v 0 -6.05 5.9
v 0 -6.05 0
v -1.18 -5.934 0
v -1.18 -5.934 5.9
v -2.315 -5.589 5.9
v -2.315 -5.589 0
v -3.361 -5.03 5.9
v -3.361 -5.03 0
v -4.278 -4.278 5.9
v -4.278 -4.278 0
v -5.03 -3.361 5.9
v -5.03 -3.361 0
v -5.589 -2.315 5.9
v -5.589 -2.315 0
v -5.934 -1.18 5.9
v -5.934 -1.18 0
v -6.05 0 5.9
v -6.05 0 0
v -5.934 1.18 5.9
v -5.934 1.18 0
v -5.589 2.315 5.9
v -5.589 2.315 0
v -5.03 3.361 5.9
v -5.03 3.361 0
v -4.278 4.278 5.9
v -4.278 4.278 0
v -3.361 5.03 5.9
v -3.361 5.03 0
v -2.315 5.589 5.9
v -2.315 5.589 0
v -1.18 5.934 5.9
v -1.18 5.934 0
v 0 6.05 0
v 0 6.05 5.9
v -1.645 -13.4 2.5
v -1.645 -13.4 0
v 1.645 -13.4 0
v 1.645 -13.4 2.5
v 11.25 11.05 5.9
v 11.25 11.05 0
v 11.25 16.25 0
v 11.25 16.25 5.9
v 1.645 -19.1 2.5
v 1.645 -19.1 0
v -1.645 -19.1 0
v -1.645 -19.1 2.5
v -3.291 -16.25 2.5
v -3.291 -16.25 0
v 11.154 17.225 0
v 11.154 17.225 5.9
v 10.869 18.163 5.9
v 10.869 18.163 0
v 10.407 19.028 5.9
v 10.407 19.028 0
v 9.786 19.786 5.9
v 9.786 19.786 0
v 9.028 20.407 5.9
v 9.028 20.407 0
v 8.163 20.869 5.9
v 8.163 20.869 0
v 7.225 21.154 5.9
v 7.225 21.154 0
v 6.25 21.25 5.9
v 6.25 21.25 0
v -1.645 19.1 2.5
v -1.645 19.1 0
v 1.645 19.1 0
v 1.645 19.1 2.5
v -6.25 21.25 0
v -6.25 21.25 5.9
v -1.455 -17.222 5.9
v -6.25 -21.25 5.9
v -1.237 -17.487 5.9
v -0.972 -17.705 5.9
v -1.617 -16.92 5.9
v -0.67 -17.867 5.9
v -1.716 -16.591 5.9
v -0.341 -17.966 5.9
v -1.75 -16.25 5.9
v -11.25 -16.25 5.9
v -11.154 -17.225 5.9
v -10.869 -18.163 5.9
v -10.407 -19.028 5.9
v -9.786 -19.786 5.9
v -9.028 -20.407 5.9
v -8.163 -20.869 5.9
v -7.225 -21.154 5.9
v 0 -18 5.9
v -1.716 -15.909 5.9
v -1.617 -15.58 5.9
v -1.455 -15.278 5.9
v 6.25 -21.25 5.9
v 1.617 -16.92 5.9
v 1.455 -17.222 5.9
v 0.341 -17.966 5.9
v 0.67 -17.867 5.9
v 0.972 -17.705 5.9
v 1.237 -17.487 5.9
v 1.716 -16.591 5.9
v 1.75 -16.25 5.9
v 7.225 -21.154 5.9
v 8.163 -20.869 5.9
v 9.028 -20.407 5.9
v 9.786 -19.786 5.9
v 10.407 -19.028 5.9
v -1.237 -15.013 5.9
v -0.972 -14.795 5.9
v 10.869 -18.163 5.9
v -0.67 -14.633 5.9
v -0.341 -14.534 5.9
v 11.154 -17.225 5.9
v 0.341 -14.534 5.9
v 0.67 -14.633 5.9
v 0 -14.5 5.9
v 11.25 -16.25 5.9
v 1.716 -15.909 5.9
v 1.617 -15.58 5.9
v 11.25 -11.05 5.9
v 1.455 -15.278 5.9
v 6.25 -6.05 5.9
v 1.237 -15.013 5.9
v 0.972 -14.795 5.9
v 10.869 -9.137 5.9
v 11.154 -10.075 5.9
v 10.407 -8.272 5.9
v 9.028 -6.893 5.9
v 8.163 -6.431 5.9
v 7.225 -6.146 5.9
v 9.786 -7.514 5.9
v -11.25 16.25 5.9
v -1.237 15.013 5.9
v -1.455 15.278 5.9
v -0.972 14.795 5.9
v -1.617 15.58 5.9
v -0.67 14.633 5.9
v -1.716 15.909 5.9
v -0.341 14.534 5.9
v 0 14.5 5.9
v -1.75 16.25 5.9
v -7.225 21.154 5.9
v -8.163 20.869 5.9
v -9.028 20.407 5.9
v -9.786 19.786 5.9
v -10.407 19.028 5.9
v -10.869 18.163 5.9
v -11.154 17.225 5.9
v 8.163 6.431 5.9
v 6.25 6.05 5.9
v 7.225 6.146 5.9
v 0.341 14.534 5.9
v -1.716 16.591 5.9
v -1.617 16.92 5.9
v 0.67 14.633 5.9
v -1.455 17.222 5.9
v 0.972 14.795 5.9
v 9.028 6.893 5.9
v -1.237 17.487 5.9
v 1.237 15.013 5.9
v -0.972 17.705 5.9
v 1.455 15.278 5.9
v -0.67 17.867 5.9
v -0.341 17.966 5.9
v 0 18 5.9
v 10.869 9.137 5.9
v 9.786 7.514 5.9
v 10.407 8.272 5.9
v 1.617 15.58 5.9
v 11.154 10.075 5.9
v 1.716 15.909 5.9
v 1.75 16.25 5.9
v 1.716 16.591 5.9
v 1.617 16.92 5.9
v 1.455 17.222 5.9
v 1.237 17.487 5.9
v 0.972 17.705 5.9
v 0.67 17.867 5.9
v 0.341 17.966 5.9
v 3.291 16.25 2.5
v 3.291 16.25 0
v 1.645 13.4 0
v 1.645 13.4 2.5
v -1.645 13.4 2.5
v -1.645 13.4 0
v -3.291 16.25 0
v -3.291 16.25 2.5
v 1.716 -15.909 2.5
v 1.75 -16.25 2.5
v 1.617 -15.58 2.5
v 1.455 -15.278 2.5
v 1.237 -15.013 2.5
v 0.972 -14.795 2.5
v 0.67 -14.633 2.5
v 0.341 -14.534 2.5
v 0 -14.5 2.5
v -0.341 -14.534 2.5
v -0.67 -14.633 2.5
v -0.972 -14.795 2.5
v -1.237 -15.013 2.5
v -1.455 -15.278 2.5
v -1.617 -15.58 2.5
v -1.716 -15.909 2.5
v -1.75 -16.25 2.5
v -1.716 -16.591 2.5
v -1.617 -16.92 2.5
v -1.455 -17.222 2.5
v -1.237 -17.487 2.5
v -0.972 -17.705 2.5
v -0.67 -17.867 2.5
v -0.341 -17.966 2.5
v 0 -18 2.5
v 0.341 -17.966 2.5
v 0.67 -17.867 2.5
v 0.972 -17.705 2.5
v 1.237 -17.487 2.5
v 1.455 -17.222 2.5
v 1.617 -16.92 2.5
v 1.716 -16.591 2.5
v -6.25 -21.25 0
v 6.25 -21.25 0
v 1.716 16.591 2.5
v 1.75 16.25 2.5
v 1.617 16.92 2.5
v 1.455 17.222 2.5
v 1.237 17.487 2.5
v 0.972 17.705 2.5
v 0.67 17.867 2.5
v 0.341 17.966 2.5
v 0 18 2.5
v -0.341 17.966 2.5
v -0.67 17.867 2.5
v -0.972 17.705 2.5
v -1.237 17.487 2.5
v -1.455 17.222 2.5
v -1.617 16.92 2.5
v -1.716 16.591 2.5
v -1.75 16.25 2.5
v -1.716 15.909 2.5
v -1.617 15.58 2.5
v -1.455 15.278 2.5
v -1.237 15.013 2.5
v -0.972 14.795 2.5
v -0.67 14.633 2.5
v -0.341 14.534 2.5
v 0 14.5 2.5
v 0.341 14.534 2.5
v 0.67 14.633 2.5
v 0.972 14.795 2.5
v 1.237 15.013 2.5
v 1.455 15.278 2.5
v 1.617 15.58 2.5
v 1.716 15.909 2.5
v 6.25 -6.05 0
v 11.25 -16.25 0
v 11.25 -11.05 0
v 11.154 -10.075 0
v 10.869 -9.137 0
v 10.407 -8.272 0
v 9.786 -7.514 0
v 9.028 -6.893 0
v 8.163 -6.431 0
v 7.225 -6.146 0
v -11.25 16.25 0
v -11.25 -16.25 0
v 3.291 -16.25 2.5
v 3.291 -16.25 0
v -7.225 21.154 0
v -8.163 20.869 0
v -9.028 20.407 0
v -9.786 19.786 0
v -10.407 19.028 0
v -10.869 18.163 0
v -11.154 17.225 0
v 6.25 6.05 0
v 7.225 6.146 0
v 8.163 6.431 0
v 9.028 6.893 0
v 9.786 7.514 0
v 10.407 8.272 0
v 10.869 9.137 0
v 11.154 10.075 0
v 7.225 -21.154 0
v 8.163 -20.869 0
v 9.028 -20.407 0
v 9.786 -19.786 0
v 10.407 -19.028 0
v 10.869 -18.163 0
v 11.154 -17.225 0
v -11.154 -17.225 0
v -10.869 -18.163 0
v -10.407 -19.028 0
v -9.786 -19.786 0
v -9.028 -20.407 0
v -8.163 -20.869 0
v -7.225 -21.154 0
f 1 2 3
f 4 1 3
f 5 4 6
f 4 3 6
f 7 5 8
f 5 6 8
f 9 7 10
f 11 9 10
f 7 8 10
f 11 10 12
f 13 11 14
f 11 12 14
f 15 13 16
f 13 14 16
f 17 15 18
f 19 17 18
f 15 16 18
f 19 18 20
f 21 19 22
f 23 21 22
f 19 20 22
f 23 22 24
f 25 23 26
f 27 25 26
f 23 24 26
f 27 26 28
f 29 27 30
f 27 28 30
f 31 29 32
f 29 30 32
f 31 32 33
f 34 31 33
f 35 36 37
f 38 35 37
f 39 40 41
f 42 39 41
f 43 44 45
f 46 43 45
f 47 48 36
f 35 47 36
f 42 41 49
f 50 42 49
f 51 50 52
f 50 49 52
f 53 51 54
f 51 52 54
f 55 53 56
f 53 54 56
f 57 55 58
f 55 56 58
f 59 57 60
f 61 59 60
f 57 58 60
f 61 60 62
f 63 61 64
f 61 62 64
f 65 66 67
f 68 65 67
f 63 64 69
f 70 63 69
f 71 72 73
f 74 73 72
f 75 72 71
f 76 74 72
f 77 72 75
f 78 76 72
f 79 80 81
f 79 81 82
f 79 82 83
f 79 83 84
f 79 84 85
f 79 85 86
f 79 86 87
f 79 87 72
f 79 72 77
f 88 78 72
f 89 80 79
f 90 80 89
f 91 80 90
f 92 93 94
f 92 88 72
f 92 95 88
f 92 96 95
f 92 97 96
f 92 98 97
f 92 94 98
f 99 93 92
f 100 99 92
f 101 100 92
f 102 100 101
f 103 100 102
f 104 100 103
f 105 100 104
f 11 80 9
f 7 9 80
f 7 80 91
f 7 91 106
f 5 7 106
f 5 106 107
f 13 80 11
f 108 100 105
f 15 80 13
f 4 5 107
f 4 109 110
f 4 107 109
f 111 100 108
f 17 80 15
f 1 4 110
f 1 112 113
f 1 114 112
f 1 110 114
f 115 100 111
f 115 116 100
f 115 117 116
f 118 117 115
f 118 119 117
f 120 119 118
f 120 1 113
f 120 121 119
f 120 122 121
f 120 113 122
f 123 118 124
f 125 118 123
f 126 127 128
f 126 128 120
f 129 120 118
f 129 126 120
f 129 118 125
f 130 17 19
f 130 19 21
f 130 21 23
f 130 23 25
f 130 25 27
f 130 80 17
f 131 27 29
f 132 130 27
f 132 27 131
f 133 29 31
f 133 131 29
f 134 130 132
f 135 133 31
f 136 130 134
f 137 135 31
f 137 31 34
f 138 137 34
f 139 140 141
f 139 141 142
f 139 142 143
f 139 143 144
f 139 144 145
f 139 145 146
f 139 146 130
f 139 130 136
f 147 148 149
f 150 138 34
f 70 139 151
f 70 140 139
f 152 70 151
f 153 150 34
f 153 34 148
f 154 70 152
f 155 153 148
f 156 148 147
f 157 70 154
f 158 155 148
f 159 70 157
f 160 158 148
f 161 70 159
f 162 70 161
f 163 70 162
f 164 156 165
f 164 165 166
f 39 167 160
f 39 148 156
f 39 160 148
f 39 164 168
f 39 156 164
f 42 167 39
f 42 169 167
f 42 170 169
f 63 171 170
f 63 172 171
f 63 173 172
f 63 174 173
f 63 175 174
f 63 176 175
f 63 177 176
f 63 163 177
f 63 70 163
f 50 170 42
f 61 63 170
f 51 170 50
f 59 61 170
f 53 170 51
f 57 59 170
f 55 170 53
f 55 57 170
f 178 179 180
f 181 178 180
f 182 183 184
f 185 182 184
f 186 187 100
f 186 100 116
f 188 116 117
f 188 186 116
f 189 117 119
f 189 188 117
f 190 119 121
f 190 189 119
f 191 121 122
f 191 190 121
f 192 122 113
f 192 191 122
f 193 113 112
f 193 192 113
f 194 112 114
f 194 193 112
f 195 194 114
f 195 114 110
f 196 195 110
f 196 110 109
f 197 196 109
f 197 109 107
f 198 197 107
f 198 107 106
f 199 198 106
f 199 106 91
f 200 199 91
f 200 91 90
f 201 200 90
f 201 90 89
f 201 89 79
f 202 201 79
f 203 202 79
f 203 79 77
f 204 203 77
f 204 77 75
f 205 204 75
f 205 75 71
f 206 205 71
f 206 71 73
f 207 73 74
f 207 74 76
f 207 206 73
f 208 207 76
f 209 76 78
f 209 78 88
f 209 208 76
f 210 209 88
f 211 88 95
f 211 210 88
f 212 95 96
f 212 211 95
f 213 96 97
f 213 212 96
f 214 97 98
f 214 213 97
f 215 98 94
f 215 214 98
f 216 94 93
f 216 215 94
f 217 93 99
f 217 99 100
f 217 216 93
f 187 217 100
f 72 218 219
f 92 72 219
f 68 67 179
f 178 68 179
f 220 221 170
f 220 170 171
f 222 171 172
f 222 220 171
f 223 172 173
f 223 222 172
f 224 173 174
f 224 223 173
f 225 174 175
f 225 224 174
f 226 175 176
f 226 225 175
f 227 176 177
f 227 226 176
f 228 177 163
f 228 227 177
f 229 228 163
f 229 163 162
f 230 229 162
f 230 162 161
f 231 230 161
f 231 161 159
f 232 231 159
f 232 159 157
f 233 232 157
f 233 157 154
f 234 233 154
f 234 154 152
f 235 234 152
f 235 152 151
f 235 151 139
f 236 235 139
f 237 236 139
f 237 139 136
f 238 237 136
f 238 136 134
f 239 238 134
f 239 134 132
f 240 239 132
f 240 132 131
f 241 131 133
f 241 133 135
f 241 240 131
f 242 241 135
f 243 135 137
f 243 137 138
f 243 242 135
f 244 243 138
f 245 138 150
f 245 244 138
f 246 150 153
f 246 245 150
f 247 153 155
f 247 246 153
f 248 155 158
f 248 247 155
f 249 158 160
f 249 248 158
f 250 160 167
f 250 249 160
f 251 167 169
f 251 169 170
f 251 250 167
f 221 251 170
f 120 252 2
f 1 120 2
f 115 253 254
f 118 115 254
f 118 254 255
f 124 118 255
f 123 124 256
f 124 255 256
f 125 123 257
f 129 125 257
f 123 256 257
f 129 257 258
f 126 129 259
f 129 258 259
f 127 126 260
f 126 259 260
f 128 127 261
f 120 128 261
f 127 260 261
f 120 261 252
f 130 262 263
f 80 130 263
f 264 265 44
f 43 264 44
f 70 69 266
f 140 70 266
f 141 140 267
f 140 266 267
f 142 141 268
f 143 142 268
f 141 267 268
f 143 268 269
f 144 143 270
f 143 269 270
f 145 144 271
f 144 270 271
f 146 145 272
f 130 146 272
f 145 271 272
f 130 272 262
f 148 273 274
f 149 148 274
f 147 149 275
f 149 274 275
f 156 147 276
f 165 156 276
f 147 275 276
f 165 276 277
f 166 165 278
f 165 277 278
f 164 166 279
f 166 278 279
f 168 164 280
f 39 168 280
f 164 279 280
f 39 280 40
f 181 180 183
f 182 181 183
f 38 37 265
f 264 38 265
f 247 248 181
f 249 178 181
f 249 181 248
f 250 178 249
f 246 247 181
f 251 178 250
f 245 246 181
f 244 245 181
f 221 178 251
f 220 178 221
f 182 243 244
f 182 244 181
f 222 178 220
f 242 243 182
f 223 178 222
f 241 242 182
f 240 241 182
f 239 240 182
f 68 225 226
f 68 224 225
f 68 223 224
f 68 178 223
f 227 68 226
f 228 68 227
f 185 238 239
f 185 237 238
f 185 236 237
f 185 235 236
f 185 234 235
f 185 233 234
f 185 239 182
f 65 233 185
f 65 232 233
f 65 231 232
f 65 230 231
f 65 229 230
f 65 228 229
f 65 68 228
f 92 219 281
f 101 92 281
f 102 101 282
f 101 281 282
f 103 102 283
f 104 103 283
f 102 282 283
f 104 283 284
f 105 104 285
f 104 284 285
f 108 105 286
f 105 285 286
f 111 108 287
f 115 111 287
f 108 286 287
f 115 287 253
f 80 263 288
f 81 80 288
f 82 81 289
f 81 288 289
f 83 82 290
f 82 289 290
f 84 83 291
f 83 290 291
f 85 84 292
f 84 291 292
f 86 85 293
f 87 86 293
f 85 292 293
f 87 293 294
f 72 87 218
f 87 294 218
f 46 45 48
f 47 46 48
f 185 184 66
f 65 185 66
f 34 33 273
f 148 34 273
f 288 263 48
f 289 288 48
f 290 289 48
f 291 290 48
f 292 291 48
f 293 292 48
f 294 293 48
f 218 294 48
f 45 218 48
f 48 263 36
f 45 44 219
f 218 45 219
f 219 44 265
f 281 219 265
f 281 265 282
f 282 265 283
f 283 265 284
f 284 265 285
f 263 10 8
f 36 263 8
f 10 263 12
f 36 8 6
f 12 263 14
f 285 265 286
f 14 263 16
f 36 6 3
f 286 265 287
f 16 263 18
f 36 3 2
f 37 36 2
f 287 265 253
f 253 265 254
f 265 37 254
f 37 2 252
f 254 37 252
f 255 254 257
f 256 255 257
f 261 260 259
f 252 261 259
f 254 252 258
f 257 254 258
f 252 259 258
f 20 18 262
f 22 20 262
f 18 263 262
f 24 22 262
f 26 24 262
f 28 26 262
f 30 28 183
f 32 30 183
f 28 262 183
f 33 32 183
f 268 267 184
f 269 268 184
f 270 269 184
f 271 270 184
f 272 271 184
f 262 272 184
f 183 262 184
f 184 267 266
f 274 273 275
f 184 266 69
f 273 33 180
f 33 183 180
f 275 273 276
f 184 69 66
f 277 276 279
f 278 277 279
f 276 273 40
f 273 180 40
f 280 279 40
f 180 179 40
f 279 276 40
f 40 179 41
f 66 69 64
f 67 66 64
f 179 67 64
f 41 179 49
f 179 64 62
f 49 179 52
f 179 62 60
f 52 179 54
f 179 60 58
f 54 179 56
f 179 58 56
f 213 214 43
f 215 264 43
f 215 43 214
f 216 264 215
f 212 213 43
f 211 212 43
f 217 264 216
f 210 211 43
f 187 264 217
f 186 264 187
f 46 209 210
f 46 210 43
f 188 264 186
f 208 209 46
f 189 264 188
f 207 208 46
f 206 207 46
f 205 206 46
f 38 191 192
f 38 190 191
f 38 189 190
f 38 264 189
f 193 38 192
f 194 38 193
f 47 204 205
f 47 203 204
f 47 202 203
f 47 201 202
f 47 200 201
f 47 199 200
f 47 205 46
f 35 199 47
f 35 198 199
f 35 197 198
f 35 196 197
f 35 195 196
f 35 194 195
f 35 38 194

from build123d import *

# Parameters (mm, degrees)
SKETCH_1_R          = 1.75
EXTRUDE_1_DEPTH     = 5.9
CUT_EXTRUDE_1_DEPTH = 2.5


with BuildPart() as part:
    # 草图1 → 凸台-拉伸1 (new body)
    with BuildSketch(Plane.XY):
        with BuildLine():
            Line((-11.25, 16.25), (-11.25, -16.25))
            ThreePointArc((-11.25, -16.25), (-9.785533906, -19.785533906), (-6.25, -21.25))
            Line((-6.25, -21.25), (6.25, -21.25))
            ThreePointArc((6.25, -21.25), (9.785533906, -19.785533906), (11.25, -16.25))
            Line((11.25, -16.25), (11.25, -11.05))
            ThreePointArc((11.25, -11.05), (9.785533906, -7.514466094), (6.25, -6.05))
            Line((6.25, -6.05), (0, -6.05))
            ThreePointArc((0, -6.05), (-6.05, 0), (0, 6.05))
            Line((0, 6.05), (6.25, 6.05))
            ThreePointArc((6.25, 6.05), (9.785533906, 7.514466094), (11.25, 11.05))
            Line((11.25, 11.05), (11.25, 16.25))
            ThreePointArc((11.25, 16.25), (9.785533906, 19.785533906), (6.25, 21.25))
            Line((6.25, 21.25), (-6.25, 21.25))
            ThreePointArc((-6.25, 21.25), (-9.785533906, 19.785533906), (-11.25, 16.25))
        make_face()
        with Locations((0, 16.25)):
            Circle(SKETCH_1_R, mode=Mode.SUBTRACT)
        with Locations((0, -16.25)):
            Circle(SKETCH_1_R, mode=Mode.SUBTRACT)
    extrude(amount=EXTRUDE_1_DEPTH)

    # 草图2 → 切除-拉伸1 (cut)
    with BuildSketch(Plane(origin=(0, 0, 0), x_dir=(-1, 0, 0), z_dir=(0, 0, -1))):
        Polygon((1.645448267, 13.4), (3.290896534, 16.25), (1.645448267, 19.1), (-1.645448267, 19.1), (-3.290896534, 16.25), (-1.645448267, 13.4), align=None)
        Polygon((-1.645448267, -13.4), (-3.290896534, -16.25), (-1.645448267, -19.1), (1.645448267, -19.1), (3.290896534, -16.25), (1.645448267, -13.4), align=None)
    extrude(amount=-CUT_EXTRUDE_1_DEPTH, mode=Mode.SUBTRACT)


solid = part.part
